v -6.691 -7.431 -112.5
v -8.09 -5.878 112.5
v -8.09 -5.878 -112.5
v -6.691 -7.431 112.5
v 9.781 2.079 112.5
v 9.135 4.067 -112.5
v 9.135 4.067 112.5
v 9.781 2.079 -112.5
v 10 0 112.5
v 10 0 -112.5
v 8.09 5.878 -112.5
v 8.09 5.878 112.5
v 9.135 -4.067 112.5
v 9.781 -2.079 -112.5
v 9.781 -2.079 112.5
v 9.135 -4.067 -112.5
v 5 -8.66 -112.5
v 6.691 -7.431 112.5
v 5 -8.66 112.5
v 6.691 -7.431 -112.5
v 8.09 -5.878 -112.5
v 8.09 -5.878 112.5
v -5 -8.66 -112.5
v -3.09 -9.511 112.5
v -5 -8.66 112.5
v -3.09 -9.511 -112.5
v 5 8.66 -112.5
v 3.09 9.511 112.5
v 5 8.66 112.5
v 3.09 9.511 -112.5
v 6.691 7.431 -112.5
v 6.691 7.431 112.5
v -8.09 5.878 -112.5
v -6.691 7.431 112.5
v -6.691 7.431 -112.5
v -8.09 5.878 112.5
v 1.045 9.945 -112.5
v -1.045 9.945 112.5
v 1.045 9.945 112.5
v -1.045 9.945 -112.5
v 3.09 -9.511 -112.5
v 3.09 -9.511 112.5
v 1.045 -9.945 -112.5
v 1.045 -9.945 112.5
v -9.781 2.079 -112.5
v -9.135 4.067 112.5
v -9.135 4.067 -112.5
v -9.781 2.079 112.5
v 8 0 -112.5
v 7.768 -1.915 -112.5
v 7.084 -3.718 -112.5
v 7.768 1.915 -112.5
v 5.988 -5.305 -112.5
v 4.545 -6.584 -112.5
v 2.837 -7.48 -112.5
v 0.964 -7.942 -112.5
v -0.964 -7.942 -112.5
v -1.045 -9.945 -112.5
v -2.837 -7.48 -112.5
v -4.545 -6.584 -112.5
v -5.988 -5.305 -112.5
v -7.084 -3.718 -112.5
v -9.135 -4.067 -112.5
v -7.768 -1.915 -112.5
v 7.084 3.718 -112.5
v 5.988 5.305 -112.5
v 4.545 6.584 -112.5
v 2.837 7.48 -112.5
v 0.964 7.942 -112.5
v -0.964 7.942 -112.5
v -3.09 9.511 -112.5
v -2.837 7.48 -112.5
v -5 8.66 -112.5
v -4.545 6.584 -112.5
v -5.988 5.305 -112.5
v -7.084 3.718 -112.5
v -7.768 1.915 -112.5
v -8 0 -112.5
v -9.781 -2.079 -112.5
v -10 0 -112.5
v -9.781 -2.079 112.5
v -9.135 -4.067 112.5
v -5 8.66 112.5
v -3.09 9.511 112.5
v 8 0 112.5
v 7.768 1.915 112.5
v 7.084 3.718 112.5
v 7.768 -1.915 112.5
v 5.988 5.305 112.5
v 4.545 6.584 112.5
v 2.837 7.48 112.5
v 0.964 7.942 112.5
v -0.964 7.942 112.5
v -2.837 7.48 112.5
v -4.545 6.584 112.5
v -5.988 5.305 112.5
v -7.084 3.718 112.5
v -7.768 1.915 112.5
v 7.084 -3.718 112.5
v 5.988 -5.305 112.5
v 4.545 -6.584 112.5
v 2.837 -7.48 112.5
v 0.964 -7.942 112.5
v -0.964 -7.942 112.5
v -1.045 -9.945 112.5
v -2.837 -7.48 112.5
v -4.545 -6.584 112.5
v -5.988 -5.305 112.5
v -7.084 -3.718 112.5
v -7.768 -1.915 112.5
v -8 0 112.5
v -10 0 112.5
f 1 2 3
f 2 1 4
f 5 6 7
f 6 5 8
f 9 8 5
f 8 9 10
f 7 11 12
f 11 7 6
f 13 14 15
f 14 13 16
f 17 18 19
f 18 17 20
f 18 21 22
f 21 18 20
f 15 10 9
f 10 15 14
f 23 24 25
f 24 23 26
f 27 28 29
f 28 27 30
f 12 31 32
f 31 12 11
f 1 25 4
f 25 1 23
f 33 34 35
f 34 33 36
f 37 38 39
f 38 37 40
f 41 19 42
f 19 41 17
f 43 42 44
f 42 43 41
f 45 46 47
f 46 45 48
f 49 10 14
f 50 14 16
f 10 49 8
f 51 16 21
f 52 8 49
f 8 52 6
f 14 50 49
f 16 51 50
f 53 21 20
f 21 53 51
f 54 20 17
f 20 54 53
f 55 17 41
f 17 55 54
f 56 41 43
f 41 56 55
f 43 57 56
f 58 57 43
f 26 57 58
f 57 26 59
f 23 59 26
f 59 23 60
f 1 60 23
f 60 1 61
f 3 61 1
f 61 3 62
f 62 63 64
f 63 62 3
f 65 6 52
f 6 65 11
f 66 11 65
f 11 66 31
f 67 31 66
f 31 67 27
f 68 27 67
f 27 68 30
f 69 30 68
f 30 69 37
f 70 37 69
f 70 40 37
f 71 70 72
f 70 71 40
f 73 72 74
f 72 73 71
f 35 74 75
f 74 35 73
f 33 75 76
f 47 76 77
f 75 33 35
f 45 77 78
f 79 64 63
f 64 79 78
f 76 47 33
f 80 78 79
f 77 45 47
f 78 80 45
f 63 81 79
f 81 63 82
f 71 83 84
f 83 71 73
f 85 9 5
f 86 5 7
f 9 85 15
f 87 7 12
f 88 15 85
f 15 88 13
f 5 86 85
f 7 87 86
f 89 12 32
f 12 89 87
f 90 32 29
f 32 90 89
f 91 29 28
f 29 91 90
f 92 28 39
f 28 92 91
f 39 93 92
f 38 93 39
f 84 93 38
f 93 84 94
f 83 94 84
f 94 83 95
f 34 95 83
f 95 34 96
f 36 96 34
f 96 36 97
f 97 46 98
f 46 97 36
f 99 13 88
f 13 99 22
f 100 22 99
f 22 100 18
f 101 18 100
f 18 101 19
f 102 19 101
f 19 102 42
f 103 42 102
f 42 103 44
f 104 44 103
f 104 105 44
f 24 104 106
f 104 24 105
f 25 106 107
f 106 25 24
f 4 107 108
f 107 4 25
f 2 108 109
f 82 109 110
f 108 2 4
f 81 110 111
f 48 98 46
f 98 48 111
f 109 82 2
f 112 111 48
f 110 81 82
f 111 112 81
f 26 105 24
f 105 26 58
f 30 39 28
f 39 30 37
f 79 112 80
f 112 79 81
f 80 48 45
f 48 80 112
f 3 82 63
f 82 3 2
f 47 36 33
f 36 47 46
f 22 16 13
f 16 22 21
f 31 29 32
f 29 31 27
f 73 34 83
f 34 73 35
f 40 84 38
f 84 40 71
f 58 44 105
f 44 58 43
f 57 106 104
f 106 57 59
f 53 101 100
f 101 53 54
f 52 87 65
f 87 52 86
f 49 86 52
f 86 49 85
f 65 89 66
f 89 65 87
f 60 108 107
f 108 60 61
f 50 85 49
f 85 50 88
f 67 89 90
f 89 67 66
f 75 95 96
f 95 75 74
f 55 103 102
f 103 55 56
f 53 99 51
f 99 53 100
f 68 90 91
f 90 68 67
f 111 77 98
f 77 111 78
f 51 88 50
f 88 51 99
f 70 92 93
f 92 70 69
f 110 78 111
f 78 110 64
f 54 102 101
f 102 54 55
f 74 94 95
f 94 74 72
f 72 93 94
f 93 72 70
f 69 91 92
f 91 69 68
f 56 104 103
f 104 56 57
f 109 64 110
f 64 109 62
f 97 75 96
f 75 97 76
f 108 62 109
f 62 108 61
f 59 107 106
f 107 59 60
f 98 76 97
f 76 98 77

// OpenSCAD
// file: Bohrung.scad
// Andre Betz
// github@AndreBetz.de
SchraubeM2 = 2.4;
SchraubeM3 = 3.4;

module Bohrloch(Durchmesser,posX,posY,Hoehe) 
{
    translate([posX,posY,-1])
        cylinder(
            Hoehe,
            Durchmesser/2,
            Durchmesser/2,
            center = false);
}
// main file
// Andre Betz
// github@AndreBetz.de
include <Bohrung.scad>


module MotorHalterung()
{
    Laenge = 225;
    DurchmesserAussen = 10;
    DurchmesserInnen  = 8;
    
    difference() 
    {
        cylinder(Laenge,DurchmesserAussen,DurchmesserAussen,        true);
        cylinder(Laenge+1,DurchmesserInnen,DurchmesserInnen,        true);
        
    }
}

MotorHalterung();
